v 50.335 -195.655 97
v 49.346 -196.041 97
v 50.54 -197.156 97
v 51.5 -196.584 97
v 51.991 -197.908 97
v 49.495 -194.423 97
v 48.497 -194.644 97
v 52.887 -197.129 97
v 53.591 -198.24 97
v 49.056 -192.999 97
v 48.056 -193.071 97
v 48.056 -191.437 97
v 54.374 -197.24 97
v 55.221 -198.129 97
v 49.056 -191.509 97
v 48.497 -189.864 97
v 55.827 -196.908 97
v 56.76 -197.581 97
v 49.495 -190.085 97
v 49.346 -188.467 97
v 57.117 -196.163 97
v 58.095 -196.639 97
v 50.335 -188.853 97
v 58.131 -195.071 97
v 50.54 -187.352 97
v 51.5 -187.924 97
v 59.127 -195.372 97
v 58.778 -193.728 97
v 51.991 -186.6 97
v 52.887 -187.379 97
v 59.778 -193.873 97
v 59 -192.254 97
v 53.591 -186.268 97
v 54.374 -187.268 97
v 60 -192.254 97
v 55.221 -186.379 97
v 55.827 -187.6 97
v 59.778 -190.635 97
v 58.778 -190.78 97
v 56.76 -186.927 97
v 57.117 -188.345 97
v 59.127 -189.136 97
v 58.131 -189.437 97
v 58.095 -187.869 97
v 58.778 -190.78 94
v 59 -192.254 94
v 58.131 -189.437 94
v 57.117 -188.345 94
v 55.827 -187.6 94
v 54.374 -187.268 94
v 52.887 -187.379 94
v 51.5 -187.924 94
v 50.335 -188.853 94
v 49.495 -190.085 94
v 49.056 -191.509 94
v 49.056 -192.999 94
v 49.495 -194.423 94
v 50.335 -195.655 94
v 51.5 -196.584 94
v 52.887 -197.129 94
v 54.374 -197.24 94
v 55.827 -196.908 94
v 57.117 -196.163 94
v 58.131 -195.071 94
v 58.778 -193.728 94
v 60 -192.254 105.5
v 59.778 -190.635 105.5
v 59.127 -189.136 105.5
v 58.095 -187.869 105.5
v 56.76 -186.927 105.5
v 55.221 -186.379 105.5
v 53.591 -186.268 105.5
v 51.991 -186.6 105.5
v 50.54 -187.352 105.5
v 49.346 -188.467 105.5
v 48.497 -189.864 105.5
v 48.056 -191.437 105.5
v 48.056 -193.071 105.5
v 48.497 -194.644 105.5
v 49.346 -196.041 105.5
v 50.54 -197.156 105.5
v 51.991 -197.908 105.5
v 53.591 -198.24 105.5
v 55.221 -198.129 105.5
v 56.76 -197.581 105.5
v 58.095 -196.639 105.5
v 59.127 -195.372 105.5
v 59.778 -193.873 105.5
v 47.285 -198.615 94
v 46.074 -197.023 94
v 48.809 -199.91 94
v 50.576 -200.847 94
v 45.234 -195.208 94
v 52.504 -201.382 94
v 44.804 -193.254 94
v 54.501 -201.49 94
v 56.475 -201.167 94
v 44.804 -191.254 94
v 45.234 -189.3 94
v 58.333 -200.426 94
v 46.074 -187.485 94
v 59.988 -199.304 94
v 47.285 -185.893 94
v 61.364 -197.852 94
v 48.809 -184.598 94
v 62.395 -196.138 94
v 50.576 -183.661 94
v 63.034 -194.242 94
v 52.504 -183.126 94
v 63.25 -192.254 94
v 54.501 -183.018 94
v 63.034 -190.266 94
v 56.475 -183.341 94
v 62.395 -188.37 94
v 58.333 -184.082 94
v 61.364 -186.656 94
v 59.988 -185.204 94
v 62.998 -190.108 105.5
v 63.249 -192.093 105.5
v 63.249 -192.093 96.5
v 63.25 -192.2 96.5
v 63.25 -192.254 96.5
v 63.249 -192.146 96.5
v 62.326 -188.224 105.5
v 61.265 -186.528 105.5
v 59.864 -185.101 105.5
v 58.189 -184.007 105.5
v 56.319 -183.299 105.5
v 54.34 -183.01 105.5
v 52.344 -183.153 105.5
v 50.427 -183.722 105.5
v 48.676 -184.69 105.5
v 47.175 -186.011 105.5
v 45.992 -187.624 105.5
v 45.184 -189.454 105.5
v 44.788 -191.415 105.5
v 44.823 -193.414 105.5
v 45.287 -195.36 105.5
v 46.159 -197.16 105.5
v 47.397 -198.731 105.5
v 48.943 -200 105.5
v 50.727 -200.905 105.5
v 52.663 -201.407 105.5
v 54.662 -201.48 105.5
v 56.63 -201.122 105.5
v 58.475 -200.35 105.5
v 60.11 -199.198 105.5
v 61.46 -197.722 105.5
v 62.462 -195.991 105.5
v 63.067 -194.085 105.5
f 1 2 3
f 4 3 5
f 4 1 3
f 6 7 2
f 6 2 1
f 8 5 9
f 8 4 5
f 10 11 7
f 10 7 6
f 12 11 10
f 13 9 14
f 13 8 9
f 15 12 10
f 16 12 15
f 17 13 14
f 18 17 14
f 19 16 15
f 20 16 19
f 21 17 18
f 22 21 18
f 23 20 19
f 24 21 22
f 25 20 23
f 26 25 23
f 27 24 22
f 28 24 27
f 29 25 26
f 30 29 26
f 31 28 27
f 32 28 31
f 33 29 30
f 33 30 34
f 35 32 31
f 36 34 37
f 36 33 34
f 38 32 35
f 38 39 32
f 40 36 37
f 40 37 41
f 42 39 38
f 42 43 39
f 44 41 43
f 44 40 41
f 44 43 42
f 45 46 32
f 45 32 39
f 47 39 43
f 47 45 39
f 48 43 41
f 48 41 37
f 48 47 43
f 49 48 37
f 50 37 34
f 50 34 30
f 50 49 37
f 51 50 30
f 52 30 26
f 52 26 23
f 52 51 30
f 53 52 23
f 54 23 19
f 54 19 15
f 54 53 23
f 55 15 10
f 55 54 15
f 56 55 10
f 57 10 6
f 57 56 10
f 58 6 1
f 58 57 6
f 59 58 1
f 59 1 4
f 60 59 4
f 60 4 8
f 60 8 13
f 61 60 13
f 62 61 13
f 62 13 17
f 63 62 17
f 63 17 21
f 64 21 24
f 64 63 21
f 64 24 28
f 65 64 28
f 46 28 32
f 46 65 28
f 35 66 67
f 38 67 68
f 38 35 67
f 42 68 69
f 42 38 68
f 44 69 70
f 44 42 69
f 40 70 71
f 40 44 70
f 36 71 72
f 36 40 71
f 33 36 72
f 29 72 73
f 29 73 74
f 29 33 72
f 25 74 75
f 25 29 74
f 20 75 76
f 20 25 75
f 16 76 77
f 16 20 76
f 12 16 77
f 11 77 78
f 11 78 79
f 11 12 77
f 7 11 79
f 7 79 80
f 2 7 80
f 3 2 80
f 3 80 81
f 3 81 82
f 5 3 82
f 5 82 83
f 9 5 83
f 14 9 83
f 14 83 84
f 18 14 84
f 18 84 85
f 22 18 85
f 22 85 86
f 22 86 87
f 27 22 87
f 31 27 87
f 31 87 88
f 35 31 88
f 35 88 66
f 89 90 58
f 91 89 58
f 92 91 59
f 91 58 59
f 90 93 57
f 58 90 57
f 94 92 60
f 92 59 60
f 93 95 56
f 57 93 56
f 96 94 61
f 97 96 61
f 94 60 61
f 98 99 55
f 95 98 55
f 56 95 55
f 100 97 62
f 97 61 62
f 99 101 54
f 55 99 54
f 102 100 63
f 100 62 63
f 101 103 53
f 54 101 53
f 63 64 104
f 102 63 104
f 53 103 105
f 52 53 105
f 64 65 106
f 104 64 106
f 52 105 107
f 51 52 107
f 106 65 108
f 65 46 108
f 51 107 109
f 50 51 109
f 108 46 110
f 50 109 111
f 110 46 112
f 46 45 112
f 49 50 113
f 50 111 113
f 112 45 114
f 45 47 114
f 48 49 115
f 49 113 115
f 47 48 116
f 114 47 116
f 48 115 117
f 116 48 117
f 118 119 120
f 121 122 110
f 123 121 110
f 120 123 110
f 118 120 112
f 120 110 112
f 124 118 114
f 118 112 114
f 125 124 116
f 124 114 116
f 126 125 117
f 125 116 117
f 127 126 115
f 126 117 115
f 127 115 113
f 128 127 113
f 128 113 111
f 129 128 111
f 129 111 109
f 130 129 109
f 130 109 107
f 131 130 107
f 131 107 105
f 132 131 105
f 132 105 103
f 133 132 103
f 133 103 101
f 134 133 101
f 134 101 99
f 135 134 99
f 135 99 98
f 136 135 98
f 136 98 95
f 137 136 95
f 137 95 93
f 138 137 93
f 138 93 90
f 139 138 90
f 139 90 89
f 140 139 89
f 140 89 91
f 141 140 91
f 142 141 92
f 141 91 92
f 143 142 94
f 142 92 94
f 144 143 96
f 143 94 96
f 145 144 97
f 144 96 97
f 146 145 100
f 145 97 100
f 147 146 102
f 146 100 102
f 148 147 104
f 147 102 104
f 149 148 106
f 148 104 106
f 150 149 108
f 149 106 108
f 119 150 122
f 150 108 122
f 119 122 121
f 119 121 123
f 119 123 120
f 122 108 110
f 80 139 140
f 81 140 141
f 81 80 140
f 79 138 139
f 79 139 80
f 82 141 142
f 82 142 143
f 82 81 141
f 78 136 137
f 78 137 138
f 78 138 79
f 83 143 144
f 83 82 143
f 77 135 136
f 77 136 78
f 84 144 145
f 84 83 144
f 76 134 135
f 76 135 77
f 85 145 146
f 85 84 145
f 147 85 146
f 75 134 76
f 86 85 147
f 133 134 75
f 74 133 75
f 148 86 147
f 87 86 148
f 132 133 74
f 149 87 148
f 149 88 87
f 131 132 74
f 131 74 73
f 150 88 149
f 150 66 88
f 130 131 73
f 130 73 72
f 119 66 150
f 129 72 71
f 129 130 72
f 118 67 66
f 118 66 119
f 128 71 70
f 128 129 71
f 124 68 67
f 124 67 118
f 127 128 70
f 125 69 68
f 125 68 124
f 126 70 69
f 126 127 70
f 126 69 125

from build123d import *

# Parameters (mm, degrees)
CYLINDER031_R               = 5
CYLINDER031_DEPTH           = 3
CYLINDER028_R               = 9.25
CYLINDER028_DEPTH           = 3
CYLINDER029_R               = 6
CYLINDER029_DEPTH           = 9
CYLINDER030_R               = 9.25
CYLINDER030_DEPTH           = 9
CYLINDER030_PLACEMENT_ANGLE = 1


with BuildPart() as smallplughole:
    # Cylinder031 → Cylinder031 (new body)
    with BuildSketch(Plane.XY):
        Circle(CYLINDER031_R)
    extrude(amount=CYLINDER031_DEPTH)


with BuildPart() as smallplugbas:
    # Cylinder028 → Cylinder028 (new body)
    with BuildSketch(Plane.XY):
        Circle(CYLINDER028_R)
    extrude(amount=CYLINDER028_DEPTH)

    # Cut011: cut SmallPlugHole
    add(smallplughole.part, mode=Mode.SUBTRACT)


with BuildPart() as smallplugwallhole:
    # Cylinder029 → Cylinder029 (new body)
    with BuildSketch(Plane.XY.offset(2.5)):
        Circle(CYLINDER029_R)
    extrude(amount=CYLINDER029_DEPTH)


with BuildPart() as gpu2_out_adapter:
    # Cylinder030 → Cylinder030 (new body)
    with BuildSketch(Plane.XY):
        Circle(CYLINDER030_R)
    extrude(amount=CYLINDER030_DEPTH)


with BuildPart() as gpu2_out_adapter_1:
    # Cylinder030 placement: moved
    add(gpu2_out_adapter.part.moved(Location((0, 0, 2.5))).rotate(Axis((0, 0, 2.5), (0, 0, 1)), CYLINDER030_PLACEMENT_ANGLE))

    # Cut010: cut SmallPlugWallHole
    add(smallplugwallhole.part, mode=Mode.SUBTRACT)

    # Fusion023: union SmallPlugBas
    add(smallplugbas.part)


with BuildPart() as gpu2_out_adapter_2:
    # Fusion023 placement: moved
    add(gpu2_out_adapter_1.part.moved(Location((54, -192.254, 94))))


solid = gpu2_out_adapter_2.part
